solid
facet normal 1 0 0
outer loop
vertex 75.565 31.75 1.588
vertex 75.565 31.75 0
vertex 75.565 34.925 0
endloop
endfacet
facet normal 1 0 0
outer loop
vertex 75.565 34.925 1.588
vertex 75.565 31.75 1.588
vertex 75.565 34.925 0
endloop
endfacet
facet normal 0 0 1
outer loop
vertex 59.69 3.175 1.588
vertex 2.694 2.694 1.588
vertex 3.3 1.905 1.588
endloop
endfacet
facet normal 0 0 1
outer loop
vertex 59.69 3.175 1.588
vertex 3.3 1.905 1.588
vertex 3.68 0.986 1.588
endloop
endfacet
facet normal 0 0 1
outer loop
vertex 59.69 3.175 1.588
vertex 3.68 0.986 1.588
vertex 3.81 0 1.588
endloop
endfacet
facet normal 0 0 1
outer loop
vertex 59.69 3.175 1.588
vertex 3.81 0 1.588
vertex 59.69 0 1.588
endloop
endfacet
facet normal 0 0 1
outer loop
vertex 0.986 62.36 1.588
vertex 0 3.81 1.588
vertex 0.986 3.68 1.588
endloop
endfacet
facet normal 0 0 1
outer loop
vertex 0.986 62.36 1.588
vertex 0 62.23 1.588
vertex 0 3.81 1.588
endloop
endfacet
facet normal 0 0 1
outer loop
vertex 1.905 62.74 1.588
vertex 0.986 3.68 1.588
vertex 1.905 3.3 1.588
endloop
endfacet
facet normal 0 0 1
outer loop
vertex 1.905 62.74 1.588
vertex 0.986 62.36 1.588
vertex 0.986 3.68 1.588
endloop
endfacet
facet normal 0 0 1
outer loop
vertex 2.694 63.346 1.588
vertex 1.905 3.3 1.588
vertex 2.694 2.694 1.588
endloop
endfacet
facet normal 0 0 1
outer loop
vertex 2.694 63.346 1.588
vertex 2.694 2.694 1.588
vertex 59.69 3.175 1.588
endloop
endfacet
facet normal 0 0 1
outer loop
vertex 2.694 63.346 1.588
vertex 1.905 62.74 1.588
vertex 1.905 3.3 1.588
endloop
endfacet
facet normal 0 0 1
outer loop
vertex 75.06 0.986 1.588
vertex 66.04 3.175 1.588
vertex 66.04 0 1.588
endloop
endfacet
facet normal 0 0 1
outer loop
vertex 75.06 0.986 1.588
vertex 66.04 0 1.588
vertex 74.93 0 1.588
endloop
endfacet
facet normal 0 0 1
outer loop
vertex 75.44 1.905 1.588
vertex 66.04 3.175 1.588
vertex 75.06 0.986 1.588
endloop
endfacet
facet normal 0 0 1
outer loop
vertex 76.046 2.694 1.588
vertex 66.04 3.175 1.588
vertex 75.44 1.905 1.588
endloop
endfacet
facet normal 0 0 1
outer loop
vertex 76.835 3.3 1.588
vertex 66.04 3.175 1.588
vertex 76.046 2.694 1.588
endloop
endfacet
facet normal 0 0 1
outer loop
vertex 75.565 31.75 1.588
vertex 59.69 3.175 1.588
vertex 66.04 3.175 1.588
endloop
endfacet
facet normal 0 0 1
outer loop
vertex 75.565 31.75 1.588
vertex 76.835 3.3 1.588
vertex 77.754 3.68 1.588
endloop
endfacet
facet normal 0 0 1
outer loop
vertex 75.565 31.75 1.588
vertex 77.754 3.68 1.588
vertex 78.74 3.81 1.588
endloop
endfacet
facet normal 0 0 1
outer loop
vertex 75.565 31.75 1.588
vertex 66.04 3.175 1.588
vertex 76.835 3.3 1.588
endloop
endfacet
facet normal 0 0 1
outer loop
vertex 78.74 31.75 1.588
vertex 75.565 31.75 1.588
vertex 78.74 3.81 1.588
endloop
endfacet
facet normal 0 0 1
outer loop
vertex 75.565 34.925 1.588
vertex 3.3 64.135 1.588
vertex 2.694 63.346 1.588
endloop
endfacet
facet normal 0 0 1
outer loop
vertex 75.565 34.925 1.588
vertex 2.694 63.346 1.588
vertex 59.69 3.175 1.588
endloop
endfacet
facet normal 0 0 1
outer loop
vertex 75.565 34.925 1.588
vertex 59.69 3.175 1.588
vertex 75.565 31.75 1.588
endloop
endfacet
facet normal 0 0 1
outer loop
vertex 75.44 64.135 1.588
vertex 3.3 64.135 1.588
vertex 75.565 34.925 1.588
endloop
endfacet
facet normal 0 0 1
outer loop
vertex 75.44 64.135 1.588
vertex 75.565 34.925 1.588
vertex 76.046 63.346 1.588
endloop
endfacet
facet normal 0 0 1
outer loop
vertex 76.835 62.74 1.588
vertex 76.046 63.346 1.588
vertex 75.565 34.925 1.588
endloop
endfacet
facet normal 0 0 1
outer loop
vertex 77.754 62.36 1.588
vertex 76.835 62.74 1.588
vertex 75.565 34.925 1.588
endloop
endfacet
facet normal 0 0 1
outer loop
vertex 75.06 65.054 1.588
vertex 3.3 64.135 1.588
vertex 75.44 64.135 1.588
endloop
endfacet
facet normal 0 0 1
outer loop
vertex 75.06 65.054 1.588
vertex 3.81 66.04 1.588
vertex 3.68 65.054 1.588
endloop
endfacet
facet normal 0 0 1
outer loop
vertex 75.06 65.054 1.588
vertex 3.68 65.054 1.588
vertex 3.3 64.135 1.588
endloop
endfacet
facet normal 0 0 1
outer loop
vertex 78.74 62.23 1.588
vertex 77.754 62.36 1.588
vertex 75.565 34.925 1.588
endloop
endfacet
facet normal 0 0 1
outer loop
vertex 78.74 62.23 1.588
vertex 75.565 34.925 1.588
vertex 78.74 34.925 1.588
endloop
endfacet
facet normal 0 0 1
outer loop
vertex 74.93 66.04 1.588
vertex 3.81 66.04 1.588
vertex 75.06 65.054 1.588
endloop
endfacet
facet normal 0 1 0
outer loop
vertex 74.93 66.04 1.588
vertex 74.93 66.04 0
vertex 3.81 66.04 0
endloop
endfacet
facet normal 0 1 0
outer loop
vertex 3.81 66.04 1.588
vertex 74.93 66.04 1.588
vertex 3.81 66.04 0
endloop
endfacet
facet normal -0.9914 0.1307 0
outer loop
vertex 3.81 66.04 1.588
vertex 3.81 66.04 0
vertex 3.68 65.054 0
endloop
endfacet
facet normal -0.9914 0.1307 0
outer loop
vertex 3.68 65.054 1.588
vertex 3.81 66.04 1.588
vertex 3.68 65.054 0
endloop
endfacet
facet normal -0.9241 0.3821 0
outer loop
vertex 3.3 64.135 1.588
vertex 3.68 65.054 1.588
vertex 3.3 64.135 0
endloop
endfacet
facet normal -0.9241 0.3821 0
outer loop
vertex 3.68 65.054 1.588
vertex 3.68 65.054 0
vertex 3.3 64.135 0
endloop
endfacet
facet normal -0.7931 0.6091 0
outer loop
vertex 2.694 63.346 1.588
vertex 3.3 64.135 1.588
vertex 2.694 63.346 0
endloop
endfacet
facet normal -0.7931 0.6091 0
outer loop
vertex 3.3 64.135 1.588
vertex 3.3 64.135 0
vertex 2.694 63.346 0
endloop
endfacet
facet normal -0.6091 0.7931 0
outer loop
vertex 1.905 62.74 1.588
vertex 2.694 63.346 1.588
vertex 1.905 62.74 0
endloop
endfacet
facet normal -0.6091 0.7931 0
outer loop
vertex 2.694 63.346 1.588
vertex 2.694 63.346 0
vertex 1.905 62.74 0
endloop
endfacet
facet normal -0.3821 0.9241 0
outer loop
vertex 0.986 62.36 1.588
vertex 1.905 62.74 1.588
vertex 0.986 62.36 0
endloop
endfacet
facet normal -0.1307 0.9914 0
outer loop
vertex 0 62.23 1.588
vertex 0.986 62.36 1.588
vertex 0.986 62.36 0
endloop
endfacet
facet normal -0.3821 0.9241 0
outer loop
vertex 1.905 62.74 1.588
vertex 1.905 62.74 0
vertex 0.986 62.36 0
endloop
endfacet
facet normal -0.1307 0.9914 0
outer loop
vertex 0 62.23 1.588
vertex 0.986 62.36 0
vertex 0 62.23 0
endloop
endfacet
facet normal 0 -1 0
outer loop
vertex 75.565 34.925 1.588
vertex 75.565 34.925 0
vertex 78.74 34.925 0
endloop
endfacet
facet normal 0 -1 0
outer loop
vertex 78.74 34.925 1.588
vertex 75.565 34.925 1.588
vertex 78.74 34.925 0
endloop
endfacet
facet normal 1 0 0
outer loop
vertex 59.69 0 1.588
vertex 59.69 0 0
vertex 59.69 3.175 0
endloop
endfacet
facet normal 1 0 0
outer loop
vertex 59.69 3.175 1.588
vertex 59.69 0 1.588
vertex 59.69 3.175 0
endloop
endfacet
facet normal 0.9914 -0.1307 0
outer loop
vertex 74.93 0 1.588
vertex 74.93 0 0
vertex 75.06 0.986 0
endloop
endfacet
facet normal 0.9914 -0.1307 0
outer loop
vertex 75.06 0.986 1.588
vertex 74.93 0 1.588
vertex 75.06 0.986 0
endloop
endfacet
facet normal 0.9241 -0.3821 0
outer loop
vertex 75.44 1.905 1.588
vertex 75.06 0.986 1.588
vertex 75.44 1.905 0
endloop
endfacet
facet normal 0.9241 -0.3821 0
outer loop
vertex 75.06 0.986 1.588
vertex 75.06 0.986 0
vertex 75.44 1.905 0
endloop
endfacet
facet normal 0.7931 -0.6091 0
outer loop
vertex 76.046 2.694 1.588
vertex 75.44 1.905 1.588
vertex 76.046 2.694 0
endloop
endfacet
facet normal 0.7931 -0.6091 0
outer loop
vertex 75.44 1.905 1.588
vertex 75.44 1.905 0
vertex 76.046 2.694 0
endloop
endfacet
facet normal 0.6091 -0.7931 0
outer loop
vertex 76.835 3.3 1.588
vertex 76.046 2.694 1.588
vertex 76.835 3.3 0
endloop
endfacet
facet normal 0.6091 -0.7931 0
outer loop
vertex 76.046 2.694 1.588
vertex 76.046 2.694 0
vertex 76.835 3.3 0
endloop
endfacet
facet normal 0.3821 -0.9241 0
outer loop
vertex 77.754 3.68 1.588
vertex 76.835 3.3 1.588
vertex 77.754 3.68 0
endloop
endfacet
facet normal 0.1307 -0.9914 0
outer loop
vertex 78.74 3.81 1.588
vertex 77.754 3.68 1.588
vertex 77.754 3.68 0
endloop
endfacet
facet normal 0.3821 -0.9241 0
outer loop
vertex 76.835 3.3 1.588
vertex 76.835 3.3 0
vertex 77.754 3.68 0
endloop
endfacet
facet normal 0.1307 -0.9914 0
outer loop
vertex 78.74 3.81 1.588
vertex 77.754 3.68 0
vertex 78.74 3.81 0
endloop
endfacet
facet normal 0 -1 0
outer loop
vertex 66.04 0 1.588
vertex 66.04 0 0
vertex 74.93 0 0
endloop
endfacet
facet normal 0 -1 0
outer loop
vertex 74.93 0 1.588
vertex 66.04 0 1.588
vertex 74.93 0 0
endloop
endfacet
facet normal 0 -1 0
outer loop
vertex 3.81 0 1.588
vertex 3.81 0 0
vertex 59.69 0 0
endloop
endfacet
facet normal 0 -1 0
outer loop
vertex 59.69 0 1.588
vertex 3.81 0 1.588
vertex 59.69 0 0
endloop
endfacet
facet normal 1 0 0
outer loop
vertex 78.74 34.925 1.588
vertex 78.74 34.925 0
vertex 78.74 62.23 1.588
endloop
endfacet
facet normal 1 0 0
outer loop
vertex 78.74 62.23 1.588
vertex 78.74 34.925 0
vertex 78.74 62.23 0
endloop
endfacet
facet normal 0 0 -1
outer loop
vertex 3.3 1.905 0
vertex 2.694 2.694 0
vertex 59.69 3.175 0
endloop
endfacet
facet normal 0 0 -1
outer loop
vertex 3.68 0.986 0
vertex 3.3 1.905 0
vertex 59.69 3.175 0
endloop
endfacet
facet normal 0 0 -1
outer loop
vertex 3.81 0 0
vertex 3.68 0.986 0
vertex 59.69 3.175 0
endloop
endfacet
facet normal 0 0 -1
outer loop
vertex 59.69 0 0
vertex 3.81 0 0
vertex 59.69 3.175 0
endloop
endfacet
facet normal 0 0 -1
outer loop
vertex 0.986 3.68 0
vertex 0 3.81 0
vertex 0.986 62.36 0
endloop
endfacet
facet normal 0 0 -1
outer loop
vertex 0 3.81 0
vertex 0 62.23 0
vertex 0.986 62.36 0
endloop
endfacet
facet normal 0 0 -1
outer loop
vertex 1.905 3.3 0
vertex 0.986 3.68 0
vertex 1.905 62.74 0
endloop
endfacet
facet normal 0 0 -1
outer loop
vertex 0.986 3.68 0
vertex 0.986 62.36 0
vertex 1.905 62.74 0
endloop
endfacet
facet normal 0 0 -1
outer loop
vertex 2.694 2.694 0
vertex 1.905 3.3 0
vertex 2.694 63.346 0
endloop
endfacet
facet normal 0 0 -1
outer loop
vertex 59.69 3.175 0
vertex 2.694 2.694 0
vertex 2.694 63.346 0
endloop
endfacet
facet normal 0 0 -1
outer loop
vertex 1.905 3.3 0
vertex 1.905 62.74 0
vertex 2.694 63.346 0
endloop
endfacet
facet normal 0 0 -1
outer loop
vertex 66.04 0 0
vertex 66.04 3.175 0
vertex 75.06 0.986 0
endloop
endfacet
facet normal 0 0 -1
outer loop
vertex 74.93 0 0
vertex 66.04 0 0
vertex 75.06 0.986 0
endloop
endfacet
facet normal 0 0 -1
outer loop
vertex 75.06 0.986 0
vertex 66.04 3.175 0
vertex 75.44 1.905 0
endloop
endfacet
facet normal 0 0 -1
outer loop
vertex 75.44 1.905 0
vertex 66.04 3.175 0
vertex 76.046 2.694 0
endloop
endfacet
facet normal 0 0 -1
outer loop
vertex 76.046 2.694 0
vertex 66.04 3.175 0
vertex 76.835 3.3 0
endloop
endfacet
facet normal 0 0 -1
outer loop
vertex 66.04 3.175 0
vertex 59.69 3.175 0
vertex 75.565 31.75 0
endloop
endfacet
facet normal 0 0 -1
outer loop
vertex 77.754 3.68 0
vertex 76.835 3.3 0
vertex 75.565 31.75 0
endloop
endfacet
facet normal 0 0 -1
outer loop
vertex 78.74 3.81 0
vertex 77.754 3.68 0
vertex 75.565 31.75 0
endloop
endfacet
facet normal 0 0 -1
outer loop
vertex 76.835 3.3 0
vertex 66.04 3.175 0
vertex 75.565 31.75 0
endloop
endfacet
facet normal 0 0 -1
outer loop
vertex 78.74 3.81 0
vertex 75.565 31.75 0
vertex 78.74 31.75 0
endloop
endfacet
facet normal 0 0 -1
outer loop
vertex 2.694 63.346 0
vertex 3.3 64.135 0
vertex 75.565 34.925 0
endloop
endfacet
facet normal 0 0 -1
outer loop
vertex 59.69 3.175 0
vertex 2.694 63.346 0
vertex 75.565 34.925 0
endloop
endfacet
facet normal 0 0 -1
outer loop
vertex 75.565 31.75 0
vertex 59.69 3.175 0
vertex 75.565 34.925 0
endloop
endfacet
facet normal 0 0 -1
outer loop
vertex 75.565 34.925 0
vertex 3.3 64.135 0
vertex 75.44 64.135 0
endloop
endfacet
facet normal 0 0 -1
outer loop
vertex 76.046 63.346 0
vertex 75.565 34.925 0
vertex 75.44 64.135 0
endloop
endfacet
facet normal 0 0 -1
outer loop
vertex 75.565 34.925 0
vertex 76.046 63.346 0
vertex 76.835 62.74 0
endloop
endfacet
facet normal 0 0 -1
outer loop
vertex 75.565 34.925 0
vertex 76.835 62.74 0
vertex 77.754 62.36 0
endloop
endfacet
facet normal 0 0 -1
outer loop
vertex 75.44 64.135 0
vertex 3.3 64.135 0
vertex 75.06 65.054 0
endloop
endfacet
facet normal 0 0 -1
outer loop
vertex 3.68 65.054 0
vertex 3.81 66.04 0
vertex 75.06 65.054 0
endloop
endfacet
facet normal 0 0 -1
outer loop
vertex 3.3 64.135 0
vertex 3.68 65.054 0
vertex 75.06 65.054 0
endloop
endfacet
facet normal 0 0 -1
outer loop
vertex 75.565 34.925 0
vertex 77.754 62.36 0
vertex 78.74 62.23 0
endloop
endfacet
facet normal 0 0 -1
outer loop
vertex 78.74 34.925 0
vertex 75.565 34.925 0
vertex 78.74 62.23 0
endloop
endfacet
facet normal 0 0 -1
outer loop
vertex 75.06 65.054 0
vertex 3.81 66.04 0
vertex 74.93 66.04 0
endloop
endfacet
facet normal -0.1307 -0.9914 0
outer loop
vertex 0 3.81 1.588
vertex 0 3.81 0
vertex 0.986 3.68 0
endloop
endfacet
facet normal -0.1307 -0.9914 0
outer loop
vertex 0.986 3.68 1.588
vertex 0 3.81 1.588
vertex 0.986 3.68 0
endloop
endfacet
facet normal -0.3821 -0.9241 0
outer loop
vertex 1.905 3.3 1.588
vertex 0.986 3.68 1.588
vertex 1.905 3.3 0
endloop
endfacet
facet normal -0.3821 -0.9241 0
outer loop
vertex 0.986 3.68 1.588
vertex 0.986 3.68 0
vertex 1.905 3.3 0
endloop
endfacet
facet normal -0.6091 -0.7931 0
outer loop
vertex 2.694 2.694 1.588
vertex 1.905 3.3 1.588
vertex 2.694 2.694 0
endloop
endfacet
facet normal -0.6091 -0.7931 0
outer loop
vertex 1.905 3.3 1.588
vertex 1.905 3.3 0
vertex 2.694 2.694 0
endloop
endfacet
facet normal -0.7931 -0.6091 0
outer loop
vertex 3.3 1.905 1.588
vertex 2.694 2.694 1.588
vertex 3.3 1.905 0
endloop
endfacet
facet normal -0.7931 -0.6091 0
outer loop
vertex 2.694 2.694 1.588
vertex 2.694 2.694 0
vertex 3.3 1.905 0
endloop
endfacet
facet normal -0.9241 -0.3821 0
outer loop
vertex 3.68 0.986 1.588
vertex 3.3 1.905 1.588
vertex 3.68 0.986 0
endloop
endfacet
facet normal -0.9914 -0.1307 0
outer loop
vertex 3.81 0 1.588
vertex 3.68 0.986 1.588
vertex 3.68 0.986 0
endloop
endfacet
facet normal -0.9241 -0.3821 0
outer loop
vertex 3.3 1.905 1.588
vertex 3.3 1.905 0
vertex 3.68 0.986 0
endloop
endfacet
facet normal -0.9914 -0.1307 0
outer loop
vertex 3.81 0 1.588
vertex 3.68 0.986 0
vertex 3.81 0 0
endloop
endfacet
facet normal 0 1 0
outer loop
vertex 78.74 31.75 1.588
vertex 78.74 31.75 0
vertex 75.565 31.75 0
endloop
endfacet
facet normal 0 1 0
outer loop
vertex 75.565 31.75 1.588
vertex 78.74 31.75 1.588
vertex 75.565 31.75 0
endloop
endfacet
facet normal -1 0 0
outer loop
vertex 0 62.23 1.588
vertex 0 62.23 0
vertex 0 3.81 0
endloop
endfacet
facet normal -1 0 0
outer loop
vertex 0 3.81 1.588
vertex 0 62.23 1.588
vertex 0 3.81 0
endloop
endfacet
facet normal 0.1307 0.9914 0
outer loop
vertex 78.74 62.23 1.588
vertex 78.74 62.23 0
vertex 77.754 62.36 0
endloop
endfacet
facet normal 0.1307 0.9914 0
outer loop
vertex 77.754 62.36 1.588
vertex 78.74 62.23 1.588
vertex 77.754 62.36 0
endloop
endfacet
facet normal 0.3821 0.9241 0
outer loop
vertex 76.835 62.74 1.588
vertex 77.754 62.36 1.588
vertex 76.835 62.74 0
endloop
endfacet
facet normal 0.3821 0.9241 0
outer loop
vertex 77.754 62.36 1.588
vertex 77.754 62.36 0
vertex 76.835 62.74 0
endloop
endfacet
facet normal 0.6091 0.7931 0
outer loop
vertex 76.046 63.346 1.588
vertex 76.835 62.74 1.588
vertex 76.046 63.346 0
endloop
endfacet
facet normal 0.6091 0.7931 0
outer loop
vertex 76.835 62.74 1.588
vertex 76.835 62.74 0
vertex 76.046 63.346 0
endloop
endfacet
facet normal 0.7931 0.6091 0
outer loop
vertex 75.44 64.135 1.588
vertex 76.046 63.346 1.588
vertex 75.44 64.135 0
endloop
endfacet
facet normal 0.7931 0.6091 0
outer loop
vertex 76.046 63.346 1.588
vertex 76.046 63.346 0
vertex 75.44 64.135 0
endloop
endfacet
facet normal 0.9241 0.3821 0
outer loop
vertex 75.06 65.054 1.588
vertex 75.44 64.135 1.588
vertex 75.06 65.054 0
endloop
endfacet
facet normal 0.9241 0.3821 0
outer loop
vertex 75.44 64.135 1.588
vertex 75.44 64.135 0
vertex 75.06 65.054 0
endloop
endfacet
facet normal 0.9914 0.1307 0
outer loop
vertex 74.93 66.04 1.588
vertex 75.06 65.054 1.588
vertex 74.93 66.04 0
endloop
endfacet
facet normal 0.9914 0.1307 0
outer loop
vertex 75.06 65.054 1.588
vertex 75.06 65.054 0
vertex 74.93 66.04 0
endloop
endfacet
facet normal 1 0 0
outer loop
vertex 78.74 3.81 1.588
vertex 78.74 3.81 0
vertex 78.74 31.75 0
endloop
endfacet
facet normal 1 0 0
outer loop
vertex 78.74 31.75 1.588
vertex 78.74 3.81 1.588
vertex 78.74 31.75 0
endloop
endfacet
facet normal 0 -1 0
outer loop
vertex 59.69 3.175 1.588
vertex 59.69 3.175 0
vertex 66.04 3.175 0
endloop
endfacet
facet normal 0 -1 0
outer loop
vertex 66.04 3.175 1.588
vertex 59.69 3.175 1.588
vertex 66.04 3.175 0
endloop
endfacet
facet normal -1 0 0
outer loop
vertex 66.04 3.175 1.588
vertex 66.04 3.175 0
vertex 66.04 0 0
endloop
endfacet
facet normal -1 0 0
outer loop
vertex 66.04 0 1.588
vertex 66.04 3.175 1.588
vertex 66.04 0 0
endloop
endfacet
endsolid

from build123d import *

# Parameters (mm, degrees)
F1_DEPTH = 1.5875


with BuildPart() as f1:
    # F0 (on Top) → F1 (new body)
    with BuildSketch(Plane.XY):
        with BuildLine():
            ThreePointArc((0, 3.81), (2.694077, 2.694077), (3.81, 0))
            Line((3.81, 0), (59.69, 0))
            Line((59.69, 0), (59.69, 3.175))
            Line((59.69, 3.175), (66.04, 3.175))
            Line((66.04, 3.175), (66.04, 0))
            Line((66.04, 0), (74.93, 0))
            ThreePointArc((74.93, 0), (76.045923, 2.694077), (78.74, 3.81))
            Line((78.74, 3.81), (78.74, 31.75))
            Line((78.74, 31.75), (75.565, 31.75))
            Line((75.565, 31.75), (75.565, 34.925))
            Line((75.565, 34.925), (78.74, 34.925))
            Line((78.74, 34.925), (78.74, 62.23))
            ThreePointArc((78.74, 62.23), (76.045923, 63.345923), (74.93, 66.04))
            Line((74.93, 66.04), (3.81, 66.04))
            ThreePointArc((3.81, 66.04), (2.694077, 63.345923), (0, 62.23))
            Line((0, 62.23), (0, 3.81))
        make_face()
    extrude(amount=F1_DEPTH)


solid = f1.part
